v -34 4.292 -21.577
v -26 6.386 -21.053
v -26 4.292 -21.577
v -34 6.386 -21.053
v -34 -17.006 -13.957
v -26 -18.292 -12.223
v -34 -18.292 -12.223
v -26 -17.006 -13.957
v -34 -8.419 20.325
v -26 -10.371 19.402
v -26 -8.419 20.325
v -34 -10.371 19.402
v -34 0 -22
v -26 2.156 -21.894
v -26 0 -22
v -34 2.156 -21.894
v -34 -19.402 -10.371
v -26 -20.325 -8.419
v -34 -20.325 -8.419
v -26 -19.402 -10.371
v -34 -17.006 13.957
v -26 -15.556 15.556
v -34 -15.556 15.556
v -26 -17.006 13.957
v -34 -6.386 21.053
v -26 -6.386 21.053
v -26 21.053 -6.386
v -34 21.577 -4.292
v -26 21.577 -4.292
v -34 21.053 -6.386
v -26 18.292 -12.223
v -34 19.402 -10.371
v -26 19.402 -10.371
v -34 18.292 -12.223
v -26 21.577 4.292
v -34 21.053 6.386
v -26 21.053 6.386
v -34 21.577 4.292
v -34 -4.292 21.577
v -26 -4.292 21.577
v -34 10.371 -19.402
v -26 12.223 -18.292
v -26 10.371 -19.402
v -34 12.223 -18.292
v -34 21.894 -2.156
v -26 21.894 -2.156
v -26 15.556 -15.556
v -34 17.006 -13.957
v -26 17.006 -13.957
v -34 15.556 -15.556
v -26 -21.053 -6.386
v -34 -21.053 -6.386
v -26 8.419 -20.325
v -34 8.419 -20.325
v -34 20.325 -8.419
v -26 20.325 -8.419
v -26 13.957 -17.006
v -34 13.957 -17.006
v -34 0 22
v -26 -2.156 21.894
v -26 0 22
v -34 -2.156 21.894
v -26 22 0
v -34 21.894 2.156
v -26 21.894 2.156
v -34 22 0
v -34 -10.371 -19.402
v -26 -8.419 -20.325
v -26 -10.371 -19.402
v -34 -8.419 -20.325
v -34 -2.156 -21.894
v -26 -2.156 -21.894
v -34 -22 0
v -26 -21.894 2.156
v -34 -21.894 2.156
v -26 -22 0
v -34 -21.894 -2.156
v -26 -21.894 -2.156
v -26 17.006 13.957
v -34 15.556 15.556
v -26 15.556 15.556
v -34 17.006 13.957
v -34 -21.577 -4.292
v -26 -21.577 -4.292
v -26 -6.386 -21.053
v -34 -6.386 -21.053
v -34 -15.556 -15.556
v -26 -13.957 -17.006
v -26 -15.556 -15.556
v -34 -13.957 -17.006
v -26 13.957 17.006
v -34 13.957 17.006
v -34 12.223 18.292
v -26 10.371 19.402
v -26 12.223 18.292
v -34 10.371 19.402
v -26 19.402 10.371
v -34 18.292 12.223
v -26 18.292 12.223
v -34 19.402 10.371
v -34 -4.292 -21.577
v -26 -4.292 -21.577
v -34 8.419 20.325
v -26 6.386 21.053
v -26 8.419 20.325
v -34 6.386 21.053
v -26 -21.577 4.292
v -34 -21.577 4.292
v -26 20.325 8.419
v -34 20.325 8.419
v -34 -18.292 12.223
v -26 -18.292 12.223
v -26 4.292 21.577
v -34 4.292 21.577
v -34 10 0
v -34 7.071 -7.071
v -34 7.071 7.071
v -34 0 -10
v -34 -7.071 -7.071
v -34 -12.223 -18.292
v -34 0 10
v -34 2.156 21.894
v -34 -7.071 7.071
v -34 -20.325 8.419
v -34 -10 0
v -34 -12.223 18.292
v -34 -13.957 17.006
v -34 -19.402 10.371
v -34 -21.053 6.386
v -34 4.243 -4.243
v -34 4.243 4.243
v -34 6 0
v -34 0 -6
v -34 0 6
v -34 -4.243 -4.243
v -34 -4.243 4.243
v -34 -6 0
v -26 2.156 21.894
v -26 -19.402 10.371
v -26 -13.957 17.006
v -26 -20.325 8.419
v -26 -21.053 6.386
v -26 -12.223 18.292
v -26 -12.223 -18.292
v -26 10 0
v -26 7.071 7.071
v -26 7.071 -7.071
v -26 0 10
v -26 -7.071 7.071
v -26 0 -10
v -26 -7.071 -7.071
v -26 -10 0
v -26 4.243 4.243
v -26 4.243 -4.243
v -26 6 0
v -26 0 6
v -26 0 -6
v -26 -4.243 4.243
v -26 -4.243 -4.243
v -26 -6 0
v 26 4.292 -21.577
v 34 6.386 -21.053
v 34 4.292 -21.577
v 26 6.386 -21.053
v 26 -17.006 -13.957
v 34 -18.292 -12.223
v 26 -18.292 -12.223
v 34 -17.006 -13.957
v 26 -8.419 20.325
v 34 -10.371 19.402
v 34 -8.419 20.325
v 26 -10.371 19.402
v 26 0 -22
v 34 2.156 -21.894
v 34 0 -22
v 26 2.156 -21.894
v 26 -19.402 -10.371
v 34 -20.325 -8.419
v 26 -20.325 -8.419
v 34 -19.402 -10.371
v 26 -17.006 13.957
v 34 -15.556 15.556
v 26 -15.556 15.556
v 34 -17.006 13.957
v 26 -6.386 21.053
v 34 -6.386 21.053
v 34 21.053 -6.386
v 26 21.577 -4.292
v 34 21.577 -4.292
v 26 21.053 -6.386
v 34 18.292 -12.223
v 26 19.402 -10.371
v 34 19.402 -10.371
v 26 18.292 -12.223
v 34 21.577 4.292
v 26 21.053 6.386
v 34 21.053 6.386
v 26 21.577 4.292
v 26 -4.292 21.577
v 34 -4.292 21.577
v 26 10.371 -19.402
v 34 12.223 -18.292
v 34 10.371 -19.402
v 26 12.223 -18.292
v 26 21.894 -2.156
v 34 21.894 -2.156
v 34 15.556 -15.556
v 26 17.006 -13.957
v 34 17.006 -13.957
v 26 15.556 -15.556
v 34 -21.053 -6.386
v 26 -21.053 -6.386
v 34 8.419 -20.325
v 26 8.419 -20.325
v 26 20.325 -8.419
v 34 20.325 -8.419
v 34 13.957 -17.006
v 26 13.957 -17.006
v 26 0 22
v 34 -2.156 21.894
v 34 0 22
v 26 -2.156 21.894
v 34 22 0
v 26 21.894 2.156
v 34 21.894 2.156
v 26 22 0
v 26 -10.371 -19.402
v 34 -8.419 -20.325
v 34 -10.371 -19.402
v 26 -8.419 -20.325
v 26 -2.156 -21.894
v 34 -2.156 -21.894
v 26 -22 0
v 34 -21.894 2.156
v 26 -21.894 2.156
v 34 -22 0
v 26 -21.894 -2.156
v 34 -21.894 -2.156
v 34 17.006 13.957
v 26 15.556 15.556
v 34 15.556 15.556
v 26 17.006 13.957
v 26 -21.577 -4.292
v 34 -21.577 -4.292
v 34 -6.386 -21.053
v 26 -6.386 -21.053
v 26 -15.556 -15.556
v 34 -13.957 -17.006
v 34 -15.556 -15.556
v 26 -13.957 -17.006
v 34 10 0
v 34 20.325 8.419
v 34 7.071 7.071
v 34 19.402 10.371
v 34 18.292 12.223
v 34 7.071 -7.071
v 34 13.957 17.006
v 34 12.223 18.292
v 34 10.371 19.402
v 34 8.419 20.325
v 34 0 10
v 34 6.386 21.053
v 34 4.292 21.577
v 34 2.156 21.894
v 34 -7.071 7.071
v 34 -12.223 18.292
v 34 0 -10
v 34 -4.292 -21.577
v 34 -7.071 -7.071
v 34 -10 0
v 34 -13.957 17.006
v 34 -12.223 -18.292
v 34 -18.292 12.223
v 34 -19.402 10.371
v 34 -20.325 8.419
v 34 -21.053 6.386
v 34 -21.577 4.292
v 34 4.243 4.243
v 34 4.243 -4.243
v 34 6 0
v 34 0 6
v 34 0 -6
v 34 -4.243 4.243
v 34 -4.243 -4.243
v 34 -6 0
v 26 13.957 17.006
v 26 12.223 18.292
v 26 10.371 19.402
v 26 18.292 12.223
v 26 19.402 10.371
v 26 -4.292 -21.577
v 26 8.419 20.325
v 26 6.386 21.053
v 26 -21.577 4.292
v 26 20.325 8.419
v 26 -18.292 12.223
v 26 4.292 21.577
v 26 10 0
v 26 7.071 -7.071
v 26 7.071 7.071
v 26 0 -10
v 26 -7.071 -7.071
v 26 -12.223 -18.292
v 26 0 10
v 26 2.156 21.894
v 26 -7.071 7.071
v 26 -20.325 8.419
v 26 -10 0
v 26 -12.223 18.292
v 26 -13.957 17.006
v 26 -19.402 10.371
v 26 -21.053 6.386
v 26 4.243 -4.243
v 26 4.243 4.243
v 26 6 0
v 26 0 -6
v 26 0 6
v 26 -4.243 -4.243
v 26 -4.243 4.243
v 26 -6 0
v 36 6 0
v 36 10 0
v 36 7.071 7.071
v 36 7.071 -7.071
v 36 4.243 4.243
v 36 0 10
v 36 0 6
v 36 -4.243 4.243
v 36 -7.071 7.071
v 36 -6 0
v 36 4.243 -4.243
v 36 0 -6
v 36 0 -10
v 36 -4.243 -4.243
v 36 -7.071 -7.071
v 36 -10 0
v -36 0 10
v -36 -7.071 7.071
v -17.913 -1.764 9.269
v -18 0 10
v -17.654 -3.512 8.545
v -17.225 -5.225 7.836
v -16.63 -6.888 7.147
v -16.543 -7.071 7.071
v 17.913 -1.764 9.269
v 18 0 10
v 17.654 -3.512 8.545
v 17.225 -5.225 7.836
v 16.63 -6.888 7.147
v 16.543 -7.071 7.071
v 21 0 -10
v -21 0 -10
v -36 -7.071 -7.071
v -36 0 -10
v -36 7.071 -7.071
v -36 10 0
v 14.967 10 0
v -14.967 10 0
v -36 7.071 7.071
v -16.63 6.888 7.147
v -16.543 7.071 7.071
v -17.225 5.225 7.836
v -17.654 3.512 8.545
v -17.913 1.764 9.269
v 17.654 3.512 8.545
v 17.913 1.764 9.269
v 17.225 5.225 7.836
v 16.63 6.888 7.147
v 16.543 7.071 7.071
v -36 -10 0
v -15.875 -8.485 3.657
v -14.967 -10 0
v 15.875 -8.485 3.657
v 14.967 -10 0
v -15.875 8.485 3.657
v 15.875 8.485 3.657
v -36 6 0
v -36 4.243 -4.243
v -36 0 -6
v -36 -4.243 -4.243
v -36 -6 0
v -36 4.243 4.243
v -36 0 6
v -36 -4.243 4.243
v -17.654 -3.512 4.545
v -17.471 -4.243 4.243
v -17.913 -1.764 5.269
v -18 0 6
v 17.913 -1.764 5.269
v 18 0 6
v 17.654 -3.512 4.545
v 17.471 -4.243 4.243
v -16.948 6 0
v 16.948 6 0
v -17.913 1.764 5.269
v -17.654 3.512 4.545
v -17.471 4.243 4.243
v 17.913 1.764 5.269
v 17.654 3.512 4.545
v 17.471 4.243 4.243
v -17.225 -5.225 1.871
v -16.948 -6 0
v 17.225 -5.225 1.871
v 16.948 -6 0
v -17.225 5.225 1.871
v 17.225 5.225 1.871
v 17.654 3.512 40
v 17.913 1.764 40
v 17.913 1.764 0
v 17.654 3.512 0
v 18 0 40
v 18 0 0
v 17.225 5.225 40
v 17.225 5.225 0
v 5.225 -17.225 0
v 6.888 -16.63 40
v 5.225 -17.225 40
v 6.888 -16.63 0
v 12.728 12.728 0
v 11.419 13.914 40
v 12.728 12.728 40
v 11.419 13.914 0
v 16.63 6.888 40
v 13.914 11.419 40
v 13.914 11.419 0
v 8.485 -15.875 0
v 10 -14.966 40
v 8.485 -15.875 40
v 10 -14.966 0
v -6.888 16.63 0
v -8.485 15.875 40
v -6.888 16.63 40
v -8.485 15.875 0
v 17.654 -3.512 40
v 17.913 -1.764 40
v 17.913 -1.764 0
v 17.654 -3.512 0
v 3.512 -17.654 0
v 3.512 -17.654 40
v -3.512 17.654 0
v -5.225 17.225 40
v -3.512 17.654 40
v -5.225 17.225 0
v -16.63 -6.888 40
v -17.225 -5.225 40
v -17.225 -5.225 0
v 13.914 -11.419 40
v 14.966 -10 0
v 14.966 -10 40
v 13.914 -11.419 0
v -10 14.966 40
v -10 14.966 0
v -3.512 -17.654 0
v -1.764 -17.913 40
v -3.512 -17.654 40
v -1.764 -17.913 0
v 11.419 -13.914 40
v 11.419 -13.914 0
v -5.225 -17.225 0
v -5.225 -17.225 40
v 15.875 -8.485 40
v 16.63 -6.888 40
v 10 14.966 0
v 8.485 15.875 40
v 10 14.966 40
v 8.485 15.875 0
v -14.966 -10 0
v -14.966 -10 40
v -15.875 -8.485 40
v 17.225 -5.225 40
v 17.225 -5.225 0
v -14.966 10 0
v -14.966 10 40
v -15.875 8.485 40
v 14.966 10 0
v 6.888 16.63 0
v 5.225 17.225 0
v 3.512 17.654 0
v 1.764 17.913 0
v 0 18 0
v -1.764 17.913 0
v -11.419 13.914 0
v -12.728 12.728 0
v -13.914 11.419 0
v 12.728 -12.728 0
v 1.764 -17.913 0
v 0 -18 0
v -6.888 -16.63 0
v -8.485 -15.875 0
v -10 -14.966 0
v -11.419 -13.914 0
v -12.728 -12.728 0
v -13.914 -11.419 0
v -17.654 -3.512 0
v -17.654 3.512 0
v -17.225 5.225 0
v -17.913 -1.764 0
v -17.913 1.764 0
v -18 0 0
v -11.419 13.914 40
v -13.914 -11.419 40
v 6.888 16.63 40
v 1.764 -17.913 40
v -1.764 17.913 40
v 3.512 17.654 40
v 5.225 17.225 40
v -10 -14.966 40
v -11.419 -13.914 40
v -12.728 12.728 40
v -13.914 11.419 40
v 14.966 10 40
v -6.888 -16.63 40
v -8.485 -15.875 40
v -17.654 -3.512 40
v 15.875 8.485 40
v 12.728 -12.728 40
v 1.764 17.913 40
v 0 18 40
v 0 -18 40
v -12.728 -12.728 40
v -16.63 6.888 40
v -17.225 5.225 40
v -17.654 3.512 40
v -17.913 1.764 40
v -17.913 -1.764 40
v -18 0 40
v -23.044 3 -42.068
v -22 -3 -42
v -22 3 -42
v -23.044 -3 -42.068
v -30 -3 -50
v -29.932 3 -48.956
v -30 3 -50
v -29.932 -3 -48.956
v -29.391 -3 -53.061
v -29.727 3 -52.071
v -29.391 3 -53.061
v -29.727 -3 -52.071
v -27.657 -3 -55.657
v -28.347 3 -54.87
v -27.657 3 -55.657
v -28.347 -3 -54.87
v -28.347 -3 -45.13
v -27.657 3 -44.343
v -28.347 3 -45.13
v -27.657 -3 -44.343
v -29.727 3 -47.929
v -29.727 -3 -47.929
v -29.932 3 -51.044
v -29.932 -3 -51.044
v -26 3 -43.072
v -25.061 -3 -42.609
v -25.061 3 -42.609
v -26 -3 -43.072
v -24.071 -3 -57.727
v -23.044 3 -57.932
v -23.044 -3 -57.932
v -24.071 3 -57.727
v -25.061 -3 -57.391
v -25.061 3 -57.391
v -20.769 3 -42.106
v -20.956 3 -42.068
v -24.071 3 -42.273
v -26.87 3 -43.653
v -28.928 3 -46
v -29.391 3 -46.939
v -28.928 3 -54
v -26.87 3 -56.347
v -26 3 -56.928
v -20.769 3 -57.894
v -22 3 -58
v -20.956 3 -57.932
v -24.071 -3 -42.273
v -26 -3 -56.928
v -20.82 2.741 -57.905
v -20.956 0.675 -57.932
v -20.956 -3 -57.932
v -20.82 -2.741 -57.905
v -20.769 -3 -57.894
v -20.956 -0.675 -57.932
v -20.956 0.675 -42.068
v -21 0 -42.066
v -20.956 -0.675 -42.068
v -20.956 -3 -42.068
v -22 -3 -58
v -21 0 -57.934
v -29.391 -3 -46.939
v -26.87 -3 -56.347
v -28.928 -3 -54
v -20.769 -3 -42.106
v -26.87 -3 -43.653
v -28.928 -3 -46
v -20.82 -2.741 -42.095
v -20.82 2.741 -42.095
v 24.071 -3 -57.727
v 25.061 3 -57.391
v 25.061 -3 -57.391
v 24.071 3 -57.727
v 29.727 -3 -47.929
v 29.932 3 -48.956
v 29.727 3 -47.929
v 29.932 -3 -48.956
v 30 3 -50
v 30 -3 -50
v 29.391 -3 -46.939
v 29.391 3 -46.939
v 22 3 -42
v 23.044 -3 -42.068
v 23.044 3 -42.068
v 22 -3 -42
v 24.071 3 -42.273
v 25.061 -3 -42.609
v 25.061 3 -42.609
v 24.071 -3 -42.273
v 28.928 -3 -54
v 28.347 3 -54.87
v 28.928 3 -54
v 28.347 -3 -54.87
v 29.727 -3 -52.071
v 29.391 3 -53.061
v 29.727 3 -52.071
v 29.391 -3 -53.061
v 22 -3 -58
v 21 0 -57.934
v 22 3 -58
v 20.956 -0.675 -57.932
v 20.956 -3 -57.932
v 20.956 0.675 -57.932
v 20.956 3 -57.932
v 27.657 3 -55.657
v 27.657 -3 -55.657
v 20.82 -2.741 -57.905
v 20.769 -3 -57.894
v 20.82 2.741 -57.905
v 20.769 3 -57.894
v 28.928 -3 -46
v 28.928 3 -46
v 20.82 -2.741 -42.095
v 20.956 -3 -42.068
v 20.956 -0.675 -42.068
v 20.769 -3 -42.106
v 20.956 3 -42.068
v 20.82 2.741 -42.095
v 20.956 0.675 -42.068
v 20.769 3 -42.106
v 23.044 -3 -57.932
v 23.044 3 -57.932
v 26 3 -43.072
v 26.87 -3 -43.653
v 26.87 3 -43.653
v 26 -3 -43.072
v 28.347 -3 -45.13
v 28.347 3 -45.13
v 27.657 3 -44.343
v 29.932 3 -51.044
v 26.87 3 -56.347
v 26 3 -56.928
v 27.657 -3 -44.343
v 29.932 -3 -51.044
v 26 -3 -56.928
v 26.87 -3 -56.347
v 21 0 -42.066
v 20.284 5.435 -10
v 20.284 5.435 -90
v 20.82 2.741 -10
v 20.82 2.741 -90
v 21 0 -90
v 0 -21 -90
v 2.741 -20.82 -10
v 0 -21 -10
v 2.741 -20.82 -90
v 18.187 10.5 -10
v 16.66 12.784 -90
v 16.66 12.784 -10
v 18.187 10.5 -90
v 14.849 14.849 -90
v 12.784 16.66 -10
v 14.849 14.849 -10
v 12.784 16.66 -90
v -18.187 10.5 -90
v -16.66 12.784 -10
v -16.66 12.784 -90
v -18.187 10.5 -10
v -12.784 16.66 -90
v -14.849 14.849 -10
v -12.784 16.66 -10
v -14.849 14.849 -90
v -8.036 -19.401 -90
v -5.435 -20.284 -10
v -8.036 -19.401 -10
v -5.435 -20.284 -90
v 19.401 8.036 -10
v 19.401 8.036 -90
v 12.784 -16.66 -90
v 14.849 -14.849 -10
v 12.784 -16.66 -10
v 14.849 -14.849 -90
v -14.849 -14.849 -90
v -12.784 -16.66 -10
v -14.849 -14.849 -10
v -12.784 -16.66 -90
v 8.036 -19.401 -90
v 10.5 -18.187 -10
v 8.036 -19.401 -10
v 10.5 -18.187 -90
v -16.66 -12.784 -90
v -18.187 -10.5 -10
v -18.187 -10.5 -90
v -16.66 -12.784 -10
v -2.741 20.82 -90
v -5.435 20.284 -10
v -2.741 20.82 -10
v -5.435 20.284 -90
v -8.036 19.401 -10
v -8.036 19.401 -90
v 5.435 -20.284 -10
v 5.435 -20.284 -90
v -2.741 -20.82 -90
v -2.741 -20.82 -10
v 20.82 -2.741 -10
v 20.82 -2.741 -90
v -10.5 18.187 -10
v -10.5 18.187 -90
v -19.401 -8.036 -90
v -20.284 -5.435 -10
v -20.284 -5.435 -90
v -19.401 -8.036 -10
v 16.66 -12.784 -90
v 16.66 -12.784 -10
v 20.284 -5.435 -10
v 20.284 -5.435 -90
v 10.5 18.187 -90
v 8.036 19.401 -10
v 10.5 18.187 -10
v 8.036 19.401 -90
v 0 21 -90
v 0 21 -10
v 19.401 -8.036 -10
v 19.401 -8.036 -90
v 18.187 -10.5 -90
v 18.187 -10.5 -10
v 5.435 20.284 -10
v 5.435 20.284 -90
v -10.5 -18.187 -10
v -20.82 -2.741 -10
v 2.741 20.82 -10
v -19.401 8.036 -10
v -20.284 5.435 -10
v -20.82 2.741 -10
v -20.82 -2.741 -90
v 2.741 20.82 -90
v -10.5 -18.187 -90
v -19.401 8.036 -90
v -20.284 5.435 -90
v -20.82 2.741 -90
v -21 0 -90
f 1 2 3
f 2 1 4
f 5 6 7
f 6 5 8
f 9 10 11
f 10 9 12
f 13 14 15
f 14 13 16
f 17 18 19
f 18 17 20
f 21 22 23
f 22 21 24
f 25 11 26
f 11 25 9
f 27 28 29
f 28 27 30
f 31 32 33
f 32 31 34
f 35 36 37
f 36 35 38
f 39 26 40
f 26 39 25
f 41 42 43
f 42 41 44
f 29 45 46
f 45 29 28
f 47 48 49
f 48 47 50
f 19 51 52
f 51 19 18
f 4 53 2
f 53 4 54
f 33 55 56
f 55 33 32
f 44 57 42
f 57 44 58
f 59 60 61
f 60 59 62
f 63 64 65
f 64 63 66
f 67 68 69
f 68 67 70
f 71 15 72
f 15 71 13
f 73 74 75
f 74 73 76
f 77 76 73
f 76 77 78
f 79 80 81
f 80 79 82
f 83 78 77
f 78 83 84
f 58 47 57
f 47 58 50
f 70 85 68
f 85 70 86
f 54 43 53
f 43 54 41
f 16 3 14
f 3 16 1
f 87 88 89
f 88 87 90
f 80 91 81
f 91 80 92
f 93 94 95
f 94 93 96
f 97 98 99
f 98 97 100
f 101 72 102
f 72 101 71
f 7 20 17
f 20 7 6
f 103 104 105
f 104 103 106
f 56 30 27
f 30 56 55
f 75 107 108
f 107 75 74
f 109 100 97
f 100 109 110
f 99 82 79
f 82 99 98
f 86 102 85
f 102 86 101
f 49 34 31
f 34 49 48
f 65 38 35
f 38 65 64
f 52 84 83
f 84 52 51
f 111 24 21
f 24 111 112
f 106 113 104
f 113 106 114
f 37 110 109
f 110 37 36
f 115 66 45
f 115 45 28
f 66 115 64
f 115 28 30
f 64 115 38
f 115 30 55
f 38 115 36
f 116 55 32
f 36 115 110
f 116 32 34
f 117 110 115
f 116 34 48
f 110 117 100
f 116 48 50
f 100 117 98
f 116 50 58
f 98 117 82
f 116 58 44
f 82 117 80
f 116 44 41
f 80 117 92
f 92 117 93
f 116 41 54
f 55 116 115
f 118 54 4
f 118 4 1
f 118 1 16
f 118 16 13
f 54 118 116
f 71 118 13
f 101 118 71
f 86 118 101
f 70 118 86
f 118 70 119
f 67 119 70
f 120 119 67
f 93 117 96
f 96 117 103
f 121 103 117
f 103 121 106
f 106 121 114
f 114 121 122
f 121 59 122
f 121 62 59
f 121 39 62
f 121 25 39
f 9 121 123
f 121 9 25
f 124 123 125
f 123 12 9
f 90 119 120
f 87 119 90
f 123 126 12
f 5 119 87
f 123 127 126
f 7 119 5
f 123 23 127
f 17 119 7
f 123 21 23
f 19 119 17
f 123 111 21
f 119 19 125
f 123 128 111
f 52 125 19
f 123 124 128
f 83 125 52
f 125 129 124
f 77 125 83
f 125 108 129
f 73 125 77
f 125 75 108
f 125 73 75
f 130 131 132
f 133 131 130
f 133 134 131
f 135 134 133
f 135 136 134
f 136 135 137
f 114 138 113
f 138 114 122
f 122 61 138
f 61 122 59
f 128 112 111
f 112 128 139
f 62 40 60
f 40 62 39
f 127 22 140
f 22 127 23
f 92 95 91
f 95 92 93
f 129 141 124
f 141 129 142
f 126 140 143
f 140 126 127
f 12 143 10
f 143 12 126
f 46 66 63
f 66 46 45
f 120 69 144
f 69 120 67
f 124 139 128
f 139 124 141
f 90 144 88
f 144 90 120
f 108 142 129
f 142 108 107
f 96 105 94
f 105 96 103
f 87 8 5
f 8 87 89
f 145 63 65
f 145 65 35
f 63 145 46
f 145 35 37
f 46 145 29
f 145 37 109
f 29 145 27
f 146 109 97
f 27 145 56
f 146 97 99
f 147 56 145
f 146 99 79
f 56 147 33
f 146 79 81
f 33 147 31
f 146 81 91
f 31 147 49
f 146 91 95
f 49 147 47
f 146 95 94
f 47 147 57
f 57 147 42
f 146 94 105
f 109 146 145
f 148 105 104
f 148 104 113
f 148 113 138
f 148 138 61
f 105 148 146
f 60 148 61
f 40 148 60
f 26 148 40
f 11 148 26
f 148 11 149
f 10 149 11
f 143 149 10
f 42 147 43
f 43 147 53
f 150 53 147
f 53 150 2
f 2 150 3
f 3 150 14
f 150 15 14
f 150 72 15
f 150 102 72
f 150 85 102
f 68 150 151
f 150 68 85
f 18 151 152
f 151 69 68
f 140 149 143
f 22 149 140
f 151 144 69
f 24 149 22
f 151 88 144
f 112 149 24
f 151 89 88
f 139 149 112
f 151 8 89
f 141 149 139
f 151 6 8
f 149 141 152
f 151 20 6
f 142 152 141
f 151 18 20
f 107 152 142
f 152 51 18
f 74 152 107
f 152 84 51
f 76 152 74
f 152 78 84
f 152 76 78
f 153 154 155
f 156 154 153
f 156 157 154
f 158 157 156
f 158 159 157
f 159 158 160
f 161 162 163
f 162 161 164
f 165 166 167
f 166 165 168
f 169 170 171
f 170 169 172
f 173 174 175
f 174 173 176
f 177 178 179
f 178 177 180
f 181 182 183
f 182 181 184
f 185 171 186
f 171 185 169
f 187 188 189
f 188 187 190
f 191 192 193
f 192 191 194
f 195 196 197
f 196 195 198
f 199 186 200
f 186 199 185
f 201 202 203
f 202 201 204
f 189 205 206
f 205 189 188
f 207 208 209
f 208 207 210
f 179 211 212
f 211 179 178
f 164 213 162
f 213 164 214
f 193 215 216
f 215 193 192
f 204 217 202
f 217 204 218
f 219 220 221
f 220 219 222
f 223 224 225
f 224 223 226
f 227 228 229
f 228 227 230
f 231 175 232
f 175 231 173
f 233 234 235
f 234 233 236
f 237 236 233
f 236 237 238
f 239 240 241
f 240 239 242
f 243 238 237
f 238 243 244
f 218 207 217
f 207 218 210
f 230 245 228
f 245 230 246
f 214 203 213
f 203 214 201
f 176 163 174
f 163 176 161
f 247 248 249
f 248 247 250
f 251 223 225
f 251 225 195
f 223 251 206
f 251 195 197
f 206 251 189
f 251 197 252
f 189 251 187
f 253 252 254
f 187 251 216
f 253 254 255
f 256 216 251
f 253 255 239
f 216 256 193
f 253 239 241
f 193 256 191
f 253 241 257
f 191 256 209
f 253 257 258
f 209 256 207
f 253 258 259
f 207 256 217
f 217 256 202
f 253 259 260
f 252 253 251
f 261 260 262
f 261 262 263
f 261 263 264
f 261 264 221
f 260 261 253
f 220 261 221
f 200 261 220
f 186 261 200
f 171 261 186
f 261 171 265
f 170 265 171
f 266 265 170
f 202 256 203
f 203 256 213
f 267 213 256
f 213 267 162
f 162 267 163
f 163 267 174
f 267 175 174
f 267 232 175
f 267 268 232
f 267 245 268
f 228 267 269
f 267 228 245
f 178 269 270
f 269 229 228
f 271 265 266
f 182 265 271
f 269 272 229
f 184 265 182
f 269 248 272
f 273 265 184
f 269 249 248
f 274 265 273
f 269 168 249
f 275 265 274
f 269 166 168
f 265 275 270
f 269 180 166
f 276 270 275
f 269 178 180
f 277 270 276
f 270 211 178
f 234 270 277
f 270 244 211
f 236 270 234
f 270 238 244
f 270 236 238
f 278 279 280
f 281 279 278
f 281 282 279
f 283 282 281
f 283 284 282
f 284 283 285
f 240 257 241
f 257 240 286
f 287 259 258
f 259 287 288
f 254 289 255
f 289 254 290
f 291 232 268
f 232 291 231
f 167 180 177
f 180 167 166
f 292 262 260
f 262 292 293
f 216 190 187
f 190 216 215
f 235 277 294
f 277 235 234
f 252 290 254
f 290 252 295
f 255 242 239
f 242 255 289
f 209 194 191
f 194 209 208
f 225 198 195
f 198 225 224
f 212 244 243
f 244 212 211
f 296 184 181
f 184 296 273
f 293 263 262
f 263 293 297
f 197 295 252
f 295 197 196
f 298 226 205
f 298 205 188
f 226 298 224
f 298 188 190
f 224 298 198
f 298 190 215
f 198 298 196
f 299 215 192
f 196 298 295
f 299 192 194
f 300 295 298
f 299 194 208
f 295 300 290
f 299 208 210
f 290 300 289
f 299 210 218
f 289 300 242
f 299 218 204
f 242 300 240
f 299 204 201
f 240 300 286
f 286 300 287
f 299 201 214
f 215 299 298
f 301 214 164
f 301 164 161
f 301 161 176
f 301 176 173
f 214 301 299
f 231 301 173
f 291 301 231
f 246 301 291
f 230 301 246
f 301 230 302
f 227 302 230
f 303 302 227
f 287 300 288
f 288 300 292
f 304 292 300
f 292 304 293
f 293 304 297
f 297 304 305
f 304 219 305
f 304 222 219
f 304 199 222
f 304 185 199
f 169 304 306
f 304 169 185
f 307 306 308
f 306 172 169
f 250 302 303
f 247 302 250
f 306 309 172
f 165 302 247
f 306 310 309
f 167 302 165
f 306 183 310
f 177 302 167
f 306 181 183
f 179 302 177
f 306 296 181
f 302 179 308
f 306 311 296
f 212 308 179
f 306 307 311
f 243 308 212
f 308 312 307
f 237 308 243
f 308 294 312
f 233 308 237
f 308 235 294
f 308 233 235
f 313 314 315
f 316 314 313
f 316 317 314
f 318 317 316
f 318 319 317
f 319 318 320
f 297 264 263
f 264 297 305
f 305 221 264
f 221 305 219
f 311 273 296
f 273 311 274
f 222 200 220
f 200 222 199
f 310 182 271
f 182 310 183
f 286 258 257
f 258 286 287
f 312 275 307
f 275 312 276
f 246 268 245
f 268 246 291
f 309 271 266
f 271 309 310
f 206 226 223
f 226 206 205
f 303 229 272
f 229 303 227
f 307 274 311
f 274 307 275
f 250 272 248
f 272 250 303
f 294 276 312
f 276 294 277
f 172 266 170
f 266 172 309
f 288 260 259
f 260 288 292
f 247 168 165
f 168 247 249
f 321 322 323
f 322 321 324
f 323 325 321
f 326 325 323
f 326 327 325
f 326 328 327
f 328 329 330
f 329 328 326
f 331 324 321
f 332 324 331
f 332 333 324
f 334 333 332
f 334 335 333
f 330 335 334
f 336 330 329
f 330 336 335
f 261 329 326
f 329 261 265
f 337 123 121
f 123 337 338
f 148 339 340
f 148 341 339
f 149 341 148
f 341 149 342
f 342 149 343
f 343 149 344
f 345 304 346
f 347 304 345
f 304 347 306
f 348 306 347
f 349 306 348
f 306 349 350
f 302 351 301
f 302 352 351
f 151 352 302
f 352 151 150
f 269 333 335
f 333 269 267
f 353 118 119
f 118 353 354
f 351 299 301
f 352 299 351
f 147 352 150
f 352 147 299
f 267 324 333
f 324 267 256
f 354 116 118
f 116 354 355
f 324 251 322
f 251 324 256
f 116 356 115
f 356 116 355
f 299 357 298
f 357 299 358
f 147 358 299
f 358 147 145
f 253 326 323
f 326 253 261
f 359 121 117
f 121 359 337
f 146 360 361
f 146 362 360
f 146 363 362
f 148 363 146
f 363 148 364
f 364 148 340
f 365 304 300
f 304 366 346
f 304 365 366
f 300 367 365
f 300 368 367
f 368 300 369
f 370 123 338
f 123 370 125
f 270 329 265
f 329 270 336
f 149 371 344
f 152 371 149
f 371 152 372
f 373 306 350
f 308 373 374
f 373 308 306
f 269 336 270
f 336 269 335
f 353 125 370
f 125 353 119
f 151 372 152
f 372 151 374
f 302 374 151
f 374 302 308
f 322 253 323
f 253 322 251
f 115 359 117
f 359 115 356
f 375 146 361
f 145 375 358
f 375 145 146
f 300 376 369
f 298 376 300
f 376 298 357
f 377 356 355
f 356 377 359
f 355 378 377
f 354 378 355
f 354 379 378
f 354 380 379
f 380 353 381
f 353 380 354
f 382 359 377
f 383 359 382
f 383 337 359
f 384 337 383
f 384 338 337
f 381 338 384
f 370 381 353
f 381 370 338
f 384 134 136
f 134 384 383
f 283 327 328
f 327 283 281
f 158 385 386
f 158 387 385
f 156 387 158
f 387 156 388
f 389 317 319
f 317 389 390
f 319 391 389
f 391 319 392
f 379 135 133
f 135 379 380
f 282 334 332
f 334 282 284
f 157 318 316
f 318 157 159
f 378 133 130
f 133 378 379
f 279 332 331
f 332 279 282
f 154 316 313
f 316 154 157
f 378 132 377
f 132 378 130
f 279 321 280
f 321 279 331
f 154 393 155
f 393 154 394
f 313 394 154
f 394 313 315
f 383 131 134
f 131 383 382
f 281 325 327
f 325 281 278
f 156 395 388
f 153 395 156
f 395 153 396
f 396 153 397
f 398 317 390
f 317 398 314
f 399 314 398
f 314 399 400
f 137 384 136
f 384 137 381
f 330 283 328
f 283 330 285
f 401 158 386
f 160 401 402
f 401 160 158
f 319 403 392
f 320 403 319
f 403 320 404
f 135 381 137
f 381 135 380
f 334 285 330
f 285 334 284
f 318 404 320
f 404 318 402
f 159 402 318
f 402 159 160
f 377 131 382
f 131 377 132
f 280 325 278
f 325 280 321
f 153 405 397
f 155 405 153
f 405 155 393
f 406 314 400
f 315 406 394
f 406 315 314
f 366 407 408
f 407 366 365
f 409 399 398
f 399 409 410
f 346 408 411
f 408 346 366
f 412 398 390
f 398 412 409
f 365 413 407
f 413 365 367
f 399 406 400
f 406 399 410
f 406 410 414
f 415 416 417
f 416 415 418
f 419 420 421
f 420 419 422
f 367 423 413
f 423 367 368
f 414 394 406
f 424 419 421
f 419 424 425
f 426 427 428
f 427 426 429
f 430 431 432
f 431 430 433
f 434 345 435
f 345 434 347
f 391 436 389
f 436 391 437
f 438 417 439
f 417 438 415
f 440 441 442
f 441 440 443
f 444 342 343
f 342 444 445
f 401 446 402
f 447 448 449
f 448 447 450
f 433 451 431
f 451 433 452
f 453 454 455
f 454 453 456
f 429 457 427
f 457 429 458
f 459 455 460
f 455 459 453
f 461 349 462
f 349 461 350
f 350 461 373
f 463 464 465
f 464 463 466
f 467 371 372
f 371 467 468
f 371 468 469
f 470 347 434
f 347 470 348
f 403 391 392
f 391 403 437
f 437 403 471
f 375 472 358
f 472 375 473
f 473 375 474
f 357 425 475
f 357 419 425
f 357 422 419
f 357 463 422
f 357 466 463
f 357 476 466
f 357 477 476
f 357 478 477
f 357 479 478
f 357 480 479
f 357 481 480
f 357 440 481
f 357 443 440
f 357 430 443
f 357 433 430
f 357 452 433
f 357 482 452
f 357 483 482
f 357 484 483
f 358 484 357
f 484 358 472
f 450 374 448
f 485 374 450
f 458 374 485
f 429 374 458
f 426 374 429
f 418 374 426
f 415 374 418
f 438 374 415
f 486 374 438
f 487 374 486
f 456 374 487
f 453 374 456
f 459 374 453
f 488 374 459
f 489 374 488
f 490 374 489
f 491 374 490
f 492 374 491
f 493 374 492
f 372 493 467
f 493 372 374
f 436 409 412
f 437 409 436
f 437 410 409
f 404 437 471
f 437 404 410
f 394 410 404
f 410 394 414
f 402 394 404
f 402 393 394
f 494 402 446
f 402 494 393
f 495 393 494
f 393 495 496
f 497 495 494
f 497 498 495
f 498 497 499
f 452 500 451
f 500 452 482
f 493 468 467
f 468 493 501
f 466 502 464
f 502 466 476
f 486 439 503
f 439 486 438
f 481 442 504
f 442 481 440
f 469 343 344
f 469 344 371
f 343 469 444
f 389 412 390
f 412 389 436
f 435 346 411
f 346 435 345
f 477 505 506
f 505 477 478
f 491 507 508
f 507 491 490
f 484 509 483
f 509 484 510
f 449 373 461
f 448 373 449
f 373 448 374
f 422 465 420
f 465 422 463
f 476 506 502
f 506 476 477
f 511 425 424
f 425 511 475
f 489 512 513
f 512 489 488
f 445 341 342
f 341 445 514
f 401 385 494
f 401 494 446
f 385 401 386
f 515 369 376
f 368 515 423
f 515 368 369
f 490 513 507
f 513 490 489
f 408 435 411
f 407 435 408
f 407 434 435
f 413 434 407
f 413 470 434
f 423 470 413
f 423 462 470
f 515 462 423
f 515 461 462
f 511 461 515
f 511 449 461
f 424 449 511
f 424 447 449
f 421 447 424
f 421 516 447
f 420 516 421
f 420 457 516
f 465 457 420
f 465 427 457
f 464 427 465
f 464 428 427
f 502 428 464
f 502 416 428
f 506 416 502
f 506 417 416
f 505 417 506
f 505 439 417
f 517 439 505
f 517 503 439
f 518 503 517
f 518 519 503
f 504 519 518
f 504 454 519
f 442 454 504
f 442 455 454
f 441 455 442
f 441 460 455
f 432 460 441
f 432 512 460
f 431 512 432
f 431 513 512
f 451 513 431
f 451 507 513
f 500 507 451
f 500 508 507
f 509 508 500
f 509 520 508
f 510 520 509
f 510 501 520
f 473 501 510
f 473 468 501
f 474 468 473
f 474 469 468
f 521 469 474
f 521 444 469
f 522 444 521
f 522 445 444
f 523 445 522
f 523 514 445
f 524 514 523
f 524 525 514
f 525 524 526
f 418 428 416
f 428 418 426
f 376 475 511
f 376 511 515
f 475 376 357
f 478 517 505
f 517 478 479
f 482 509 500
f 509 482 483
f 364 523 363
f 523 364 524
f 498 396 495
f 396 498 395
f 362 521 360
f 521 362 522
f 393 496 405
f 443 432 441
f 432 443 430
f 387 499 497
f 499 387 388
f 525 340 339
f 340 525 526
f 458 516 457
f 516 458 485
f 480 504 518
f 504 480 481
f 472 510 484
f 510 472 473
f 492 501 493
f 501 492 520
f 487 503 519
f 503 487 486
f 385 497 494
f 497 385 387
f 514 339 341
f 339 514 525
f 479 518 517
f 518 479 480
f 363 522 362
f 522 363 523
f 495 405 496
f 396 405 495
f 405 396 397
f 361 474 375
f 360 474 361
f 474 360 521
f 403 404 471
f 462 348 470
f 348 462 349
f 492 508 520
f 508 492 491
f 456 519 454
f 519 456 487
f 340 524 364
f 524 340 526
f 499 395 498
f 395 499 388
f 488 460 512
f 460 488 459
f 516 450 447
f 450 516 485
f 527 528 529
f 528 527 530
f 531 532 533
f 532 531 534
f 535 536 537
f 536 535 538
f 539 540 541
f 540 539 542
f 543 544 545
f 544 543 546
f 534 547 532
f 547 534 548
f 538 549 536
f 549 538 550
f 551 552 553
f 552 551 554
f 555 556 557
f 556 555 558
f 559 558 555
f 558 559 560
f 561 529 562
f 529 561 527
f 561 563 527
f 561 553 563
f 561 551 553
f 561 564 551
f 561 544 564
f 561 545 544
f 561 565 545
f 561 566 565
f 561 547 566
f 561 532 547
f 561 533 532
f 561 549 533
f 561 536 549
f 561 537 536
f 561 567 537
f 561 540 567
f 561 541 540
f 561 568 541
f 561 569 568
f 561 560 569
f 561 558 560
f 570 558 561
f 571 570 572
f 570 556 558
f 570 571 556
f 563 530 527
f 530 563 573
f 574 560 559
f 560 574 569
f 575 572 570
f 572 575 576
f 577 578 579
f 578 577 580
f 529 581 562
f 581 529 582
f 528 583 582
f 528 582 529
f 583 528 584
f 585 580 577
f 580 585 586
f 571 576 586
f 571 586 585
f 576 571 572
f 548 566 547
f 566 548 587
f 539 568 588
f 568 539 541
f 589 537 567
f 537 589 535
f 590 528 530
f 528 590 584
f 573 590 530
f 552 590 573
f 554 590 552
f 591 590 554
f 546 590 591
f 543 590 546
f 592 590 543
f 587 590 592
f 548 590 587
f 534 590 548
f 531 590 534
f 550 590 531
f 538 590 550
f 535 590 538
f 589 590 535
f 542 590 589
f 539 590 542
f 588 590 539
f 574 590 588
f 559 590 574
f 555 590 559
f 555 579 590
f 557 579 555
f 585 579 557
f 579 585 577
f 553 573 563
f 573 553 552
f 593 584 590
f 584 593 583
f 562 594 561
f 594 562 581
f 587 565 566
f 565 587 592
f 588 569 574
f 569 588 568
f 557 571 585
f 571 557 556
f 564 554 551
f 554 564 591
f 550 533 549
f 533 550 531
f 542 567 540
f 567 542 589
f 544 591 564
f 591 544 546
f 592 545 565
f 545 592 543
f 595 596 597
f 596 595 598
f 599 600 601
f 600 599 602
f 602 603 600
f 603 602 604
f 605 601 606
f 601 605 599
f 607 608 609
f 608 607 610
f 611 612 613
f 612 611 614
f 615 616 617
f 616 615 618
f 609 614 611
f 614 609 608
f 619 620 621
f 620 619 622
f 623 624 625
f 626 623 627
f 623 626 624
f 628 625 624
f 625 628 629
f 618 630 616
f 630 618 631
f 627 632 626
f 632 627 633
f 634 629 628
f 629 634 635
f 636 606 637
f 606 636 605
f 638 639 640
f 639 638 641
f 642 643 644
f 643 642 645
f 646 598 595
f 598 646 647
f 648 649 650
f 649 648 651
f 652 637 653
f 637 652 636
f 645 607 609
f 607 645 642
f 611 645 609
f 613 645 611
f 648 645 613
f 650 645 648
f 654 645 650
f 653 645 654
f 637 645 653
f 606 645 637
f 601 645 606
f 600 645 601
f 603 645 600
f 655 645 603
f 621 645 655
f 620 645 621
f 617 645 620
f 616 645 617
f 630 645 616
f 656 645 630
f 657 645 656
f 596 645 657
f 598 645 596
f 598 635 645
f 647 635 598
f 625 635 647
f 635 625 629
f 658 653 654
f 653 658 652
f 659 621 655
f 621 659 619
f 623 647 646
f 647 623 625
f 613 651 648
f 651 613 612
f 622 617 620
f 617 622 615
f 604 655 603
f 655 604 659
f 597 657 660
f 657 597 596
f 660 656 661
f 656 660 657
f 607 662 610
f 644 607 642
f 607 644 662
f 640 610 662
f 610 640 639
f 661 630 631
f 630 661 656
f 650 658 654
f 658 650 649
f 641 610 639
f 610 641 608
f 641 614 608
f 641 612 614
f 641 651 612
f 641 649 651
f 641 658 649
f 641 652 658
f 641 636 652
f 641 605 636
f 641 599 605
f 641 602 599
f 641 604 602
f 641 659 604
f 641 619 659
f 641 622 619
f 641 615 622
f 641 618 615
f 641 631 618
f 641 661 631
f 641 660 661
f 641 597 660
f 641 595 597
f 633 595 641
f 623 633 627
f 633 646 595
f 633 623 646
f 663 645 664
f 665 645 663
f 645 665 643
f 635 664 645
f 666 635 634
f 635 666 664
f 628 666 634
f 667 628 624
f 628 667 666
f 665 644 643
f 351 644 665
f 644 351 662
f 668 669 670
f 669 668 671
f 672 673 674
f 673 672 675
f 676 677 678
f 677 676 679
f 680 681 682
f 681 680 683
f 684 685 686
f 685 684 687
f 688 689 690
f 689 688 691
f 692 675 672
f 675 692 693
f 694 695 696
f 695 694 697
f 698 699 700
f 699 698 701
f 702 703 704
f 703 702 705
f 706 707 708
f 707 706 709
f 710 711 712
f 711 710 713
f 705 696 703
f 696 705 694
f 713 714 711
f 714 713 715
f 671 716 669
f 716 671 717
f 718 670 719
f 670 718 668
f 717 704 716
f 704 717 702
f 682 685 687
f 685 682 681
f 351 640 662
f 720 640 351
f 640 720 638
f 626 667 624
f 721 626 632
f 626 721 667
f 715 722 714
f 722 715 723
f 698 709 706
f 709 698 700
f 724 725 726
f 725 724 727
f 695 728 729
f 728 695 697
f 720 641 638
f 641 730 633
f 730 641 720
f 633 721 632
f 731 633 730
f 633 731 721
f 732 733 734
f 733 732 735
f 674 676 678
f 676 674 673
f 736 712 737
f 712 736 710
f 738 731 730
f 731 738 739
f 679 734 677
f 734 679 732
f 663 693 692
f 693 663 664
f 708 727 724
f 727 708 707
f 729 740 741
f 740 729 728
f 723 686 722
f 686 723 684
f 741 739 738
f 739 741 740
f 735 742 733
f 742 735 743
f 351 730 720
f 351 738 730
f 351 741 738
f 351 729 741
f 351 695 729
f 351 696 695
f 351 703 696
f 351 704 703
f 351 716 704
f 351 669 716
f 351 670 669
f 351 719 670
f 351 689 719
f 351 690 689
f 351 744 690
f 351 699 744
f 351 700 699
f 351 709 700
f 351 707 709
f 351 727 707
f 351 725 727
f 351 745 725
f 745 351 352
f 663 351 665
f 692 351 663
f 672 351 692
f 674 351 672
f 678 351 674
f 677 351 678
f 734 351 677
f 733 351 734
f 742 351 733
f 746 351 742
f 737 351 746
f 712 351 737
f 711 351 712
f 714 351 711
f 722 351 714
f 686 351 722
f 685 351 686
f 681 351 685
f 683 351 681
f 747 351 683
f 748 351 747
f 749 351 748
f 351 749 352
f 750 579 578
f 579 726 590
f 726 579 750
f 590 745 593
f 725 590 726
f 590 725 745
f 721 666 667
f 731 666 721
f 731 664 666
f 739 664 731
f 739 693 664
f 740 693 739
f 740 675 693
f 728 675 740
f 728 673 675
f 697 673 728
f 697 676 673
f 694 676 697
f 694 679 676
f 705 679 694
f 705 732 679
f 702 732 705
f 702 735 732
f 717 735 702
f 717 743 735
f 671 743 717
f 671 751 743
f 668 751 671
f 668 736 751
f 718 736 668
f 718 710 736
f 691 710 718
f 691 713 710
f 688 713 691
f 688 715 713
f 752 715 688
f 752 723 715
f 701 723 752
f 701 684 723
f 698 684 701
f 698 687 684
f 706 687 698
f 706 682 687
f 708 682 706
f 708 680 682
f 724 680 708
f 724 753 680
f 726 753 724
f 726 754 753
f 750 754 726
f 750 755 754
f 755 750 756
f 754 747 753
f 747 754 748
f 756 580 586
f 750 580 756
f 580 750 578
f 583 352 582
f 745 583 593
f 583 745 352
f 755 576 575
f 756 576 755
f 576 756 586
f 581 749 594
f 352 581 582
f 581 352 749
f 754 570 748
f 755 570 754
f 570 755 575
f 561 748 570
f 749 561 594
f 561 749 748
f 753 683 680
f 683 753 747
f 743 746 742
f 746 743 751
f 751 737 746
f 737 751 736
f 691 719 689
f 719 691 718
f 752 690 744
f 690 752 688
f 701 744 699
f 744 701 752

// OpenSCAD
// ============================================================
//  cable_wrist.scad — cord-driven differential wrist (SCHEMATIC)
//
//  Two cords A,B (from base motors) turn two side bevels on the PITCH
//  axis; a central bevel on the ROLL axis is the differential output.
//    A,B same dir -> ROLL (J6) ;  A,B opposite -> PITCH (J5)
//  Carrier yoke = pitch axis. Cords route down the forearm centerline,
//  redirect idlers set the pull-pull tangent points.
//
//  Schematic only: bevels shown as cylinders; cords not drawn.
//  See cable_wrist_spec.md.
// ============================================================

Rside = 22;   // side bevel/pulley radius (cord wraps here)
Rcap  = 18;   // central (roll output) bevel radius
yoke  = 60;   // pitch-axis span
 id_R  = 8;    // redirect idler radius

module bevel(r) { color("steelblue") cylinder(h=8, r=r, center=true, $fn=64); }

module differential() {
    // pitch axis = X ; side bevels A/B at +/-yoke/2
    for (s=[-1,1]) translate([s*yoke/2,0,0]) rotate([0,90,0]) bevel(Rside);
    // central roll output on Z (tool axis), meshing both sides
    color("seagreen") cylinder(h=40, r=Rcap, $fn=64);
    // carrier yoke (pitch frame)
    color("gainsboro") difference() {
        translate([-yoke/2-6,0,0]) rotate([0,90,0]) cylinder(h=yoke+12, r=10,$fn=8);
        translate([-yoke/2-7,0,0]) rotate([0,90,0]) cylinder(h=yoke+14, r=6,$fn=8);
    }
}

module redirect_idlers() {
    // two idlers on the forearm bringing cords A,B to side-bevel tangents
    color("orange") for (s=[-1,1])
        translate([s*Rside, 0, -50]) rotate([90,0,0]) cylinder(h=6,r=id_R,center=true,$fn=48);
}

module forearm_stub() {
    color([.8,.8,.8,.5]) translate([0,0,-90]) cylinder(h=80, d=42, $fn=48);
}

differential();
redirect_idlers();
forearm_stub();
